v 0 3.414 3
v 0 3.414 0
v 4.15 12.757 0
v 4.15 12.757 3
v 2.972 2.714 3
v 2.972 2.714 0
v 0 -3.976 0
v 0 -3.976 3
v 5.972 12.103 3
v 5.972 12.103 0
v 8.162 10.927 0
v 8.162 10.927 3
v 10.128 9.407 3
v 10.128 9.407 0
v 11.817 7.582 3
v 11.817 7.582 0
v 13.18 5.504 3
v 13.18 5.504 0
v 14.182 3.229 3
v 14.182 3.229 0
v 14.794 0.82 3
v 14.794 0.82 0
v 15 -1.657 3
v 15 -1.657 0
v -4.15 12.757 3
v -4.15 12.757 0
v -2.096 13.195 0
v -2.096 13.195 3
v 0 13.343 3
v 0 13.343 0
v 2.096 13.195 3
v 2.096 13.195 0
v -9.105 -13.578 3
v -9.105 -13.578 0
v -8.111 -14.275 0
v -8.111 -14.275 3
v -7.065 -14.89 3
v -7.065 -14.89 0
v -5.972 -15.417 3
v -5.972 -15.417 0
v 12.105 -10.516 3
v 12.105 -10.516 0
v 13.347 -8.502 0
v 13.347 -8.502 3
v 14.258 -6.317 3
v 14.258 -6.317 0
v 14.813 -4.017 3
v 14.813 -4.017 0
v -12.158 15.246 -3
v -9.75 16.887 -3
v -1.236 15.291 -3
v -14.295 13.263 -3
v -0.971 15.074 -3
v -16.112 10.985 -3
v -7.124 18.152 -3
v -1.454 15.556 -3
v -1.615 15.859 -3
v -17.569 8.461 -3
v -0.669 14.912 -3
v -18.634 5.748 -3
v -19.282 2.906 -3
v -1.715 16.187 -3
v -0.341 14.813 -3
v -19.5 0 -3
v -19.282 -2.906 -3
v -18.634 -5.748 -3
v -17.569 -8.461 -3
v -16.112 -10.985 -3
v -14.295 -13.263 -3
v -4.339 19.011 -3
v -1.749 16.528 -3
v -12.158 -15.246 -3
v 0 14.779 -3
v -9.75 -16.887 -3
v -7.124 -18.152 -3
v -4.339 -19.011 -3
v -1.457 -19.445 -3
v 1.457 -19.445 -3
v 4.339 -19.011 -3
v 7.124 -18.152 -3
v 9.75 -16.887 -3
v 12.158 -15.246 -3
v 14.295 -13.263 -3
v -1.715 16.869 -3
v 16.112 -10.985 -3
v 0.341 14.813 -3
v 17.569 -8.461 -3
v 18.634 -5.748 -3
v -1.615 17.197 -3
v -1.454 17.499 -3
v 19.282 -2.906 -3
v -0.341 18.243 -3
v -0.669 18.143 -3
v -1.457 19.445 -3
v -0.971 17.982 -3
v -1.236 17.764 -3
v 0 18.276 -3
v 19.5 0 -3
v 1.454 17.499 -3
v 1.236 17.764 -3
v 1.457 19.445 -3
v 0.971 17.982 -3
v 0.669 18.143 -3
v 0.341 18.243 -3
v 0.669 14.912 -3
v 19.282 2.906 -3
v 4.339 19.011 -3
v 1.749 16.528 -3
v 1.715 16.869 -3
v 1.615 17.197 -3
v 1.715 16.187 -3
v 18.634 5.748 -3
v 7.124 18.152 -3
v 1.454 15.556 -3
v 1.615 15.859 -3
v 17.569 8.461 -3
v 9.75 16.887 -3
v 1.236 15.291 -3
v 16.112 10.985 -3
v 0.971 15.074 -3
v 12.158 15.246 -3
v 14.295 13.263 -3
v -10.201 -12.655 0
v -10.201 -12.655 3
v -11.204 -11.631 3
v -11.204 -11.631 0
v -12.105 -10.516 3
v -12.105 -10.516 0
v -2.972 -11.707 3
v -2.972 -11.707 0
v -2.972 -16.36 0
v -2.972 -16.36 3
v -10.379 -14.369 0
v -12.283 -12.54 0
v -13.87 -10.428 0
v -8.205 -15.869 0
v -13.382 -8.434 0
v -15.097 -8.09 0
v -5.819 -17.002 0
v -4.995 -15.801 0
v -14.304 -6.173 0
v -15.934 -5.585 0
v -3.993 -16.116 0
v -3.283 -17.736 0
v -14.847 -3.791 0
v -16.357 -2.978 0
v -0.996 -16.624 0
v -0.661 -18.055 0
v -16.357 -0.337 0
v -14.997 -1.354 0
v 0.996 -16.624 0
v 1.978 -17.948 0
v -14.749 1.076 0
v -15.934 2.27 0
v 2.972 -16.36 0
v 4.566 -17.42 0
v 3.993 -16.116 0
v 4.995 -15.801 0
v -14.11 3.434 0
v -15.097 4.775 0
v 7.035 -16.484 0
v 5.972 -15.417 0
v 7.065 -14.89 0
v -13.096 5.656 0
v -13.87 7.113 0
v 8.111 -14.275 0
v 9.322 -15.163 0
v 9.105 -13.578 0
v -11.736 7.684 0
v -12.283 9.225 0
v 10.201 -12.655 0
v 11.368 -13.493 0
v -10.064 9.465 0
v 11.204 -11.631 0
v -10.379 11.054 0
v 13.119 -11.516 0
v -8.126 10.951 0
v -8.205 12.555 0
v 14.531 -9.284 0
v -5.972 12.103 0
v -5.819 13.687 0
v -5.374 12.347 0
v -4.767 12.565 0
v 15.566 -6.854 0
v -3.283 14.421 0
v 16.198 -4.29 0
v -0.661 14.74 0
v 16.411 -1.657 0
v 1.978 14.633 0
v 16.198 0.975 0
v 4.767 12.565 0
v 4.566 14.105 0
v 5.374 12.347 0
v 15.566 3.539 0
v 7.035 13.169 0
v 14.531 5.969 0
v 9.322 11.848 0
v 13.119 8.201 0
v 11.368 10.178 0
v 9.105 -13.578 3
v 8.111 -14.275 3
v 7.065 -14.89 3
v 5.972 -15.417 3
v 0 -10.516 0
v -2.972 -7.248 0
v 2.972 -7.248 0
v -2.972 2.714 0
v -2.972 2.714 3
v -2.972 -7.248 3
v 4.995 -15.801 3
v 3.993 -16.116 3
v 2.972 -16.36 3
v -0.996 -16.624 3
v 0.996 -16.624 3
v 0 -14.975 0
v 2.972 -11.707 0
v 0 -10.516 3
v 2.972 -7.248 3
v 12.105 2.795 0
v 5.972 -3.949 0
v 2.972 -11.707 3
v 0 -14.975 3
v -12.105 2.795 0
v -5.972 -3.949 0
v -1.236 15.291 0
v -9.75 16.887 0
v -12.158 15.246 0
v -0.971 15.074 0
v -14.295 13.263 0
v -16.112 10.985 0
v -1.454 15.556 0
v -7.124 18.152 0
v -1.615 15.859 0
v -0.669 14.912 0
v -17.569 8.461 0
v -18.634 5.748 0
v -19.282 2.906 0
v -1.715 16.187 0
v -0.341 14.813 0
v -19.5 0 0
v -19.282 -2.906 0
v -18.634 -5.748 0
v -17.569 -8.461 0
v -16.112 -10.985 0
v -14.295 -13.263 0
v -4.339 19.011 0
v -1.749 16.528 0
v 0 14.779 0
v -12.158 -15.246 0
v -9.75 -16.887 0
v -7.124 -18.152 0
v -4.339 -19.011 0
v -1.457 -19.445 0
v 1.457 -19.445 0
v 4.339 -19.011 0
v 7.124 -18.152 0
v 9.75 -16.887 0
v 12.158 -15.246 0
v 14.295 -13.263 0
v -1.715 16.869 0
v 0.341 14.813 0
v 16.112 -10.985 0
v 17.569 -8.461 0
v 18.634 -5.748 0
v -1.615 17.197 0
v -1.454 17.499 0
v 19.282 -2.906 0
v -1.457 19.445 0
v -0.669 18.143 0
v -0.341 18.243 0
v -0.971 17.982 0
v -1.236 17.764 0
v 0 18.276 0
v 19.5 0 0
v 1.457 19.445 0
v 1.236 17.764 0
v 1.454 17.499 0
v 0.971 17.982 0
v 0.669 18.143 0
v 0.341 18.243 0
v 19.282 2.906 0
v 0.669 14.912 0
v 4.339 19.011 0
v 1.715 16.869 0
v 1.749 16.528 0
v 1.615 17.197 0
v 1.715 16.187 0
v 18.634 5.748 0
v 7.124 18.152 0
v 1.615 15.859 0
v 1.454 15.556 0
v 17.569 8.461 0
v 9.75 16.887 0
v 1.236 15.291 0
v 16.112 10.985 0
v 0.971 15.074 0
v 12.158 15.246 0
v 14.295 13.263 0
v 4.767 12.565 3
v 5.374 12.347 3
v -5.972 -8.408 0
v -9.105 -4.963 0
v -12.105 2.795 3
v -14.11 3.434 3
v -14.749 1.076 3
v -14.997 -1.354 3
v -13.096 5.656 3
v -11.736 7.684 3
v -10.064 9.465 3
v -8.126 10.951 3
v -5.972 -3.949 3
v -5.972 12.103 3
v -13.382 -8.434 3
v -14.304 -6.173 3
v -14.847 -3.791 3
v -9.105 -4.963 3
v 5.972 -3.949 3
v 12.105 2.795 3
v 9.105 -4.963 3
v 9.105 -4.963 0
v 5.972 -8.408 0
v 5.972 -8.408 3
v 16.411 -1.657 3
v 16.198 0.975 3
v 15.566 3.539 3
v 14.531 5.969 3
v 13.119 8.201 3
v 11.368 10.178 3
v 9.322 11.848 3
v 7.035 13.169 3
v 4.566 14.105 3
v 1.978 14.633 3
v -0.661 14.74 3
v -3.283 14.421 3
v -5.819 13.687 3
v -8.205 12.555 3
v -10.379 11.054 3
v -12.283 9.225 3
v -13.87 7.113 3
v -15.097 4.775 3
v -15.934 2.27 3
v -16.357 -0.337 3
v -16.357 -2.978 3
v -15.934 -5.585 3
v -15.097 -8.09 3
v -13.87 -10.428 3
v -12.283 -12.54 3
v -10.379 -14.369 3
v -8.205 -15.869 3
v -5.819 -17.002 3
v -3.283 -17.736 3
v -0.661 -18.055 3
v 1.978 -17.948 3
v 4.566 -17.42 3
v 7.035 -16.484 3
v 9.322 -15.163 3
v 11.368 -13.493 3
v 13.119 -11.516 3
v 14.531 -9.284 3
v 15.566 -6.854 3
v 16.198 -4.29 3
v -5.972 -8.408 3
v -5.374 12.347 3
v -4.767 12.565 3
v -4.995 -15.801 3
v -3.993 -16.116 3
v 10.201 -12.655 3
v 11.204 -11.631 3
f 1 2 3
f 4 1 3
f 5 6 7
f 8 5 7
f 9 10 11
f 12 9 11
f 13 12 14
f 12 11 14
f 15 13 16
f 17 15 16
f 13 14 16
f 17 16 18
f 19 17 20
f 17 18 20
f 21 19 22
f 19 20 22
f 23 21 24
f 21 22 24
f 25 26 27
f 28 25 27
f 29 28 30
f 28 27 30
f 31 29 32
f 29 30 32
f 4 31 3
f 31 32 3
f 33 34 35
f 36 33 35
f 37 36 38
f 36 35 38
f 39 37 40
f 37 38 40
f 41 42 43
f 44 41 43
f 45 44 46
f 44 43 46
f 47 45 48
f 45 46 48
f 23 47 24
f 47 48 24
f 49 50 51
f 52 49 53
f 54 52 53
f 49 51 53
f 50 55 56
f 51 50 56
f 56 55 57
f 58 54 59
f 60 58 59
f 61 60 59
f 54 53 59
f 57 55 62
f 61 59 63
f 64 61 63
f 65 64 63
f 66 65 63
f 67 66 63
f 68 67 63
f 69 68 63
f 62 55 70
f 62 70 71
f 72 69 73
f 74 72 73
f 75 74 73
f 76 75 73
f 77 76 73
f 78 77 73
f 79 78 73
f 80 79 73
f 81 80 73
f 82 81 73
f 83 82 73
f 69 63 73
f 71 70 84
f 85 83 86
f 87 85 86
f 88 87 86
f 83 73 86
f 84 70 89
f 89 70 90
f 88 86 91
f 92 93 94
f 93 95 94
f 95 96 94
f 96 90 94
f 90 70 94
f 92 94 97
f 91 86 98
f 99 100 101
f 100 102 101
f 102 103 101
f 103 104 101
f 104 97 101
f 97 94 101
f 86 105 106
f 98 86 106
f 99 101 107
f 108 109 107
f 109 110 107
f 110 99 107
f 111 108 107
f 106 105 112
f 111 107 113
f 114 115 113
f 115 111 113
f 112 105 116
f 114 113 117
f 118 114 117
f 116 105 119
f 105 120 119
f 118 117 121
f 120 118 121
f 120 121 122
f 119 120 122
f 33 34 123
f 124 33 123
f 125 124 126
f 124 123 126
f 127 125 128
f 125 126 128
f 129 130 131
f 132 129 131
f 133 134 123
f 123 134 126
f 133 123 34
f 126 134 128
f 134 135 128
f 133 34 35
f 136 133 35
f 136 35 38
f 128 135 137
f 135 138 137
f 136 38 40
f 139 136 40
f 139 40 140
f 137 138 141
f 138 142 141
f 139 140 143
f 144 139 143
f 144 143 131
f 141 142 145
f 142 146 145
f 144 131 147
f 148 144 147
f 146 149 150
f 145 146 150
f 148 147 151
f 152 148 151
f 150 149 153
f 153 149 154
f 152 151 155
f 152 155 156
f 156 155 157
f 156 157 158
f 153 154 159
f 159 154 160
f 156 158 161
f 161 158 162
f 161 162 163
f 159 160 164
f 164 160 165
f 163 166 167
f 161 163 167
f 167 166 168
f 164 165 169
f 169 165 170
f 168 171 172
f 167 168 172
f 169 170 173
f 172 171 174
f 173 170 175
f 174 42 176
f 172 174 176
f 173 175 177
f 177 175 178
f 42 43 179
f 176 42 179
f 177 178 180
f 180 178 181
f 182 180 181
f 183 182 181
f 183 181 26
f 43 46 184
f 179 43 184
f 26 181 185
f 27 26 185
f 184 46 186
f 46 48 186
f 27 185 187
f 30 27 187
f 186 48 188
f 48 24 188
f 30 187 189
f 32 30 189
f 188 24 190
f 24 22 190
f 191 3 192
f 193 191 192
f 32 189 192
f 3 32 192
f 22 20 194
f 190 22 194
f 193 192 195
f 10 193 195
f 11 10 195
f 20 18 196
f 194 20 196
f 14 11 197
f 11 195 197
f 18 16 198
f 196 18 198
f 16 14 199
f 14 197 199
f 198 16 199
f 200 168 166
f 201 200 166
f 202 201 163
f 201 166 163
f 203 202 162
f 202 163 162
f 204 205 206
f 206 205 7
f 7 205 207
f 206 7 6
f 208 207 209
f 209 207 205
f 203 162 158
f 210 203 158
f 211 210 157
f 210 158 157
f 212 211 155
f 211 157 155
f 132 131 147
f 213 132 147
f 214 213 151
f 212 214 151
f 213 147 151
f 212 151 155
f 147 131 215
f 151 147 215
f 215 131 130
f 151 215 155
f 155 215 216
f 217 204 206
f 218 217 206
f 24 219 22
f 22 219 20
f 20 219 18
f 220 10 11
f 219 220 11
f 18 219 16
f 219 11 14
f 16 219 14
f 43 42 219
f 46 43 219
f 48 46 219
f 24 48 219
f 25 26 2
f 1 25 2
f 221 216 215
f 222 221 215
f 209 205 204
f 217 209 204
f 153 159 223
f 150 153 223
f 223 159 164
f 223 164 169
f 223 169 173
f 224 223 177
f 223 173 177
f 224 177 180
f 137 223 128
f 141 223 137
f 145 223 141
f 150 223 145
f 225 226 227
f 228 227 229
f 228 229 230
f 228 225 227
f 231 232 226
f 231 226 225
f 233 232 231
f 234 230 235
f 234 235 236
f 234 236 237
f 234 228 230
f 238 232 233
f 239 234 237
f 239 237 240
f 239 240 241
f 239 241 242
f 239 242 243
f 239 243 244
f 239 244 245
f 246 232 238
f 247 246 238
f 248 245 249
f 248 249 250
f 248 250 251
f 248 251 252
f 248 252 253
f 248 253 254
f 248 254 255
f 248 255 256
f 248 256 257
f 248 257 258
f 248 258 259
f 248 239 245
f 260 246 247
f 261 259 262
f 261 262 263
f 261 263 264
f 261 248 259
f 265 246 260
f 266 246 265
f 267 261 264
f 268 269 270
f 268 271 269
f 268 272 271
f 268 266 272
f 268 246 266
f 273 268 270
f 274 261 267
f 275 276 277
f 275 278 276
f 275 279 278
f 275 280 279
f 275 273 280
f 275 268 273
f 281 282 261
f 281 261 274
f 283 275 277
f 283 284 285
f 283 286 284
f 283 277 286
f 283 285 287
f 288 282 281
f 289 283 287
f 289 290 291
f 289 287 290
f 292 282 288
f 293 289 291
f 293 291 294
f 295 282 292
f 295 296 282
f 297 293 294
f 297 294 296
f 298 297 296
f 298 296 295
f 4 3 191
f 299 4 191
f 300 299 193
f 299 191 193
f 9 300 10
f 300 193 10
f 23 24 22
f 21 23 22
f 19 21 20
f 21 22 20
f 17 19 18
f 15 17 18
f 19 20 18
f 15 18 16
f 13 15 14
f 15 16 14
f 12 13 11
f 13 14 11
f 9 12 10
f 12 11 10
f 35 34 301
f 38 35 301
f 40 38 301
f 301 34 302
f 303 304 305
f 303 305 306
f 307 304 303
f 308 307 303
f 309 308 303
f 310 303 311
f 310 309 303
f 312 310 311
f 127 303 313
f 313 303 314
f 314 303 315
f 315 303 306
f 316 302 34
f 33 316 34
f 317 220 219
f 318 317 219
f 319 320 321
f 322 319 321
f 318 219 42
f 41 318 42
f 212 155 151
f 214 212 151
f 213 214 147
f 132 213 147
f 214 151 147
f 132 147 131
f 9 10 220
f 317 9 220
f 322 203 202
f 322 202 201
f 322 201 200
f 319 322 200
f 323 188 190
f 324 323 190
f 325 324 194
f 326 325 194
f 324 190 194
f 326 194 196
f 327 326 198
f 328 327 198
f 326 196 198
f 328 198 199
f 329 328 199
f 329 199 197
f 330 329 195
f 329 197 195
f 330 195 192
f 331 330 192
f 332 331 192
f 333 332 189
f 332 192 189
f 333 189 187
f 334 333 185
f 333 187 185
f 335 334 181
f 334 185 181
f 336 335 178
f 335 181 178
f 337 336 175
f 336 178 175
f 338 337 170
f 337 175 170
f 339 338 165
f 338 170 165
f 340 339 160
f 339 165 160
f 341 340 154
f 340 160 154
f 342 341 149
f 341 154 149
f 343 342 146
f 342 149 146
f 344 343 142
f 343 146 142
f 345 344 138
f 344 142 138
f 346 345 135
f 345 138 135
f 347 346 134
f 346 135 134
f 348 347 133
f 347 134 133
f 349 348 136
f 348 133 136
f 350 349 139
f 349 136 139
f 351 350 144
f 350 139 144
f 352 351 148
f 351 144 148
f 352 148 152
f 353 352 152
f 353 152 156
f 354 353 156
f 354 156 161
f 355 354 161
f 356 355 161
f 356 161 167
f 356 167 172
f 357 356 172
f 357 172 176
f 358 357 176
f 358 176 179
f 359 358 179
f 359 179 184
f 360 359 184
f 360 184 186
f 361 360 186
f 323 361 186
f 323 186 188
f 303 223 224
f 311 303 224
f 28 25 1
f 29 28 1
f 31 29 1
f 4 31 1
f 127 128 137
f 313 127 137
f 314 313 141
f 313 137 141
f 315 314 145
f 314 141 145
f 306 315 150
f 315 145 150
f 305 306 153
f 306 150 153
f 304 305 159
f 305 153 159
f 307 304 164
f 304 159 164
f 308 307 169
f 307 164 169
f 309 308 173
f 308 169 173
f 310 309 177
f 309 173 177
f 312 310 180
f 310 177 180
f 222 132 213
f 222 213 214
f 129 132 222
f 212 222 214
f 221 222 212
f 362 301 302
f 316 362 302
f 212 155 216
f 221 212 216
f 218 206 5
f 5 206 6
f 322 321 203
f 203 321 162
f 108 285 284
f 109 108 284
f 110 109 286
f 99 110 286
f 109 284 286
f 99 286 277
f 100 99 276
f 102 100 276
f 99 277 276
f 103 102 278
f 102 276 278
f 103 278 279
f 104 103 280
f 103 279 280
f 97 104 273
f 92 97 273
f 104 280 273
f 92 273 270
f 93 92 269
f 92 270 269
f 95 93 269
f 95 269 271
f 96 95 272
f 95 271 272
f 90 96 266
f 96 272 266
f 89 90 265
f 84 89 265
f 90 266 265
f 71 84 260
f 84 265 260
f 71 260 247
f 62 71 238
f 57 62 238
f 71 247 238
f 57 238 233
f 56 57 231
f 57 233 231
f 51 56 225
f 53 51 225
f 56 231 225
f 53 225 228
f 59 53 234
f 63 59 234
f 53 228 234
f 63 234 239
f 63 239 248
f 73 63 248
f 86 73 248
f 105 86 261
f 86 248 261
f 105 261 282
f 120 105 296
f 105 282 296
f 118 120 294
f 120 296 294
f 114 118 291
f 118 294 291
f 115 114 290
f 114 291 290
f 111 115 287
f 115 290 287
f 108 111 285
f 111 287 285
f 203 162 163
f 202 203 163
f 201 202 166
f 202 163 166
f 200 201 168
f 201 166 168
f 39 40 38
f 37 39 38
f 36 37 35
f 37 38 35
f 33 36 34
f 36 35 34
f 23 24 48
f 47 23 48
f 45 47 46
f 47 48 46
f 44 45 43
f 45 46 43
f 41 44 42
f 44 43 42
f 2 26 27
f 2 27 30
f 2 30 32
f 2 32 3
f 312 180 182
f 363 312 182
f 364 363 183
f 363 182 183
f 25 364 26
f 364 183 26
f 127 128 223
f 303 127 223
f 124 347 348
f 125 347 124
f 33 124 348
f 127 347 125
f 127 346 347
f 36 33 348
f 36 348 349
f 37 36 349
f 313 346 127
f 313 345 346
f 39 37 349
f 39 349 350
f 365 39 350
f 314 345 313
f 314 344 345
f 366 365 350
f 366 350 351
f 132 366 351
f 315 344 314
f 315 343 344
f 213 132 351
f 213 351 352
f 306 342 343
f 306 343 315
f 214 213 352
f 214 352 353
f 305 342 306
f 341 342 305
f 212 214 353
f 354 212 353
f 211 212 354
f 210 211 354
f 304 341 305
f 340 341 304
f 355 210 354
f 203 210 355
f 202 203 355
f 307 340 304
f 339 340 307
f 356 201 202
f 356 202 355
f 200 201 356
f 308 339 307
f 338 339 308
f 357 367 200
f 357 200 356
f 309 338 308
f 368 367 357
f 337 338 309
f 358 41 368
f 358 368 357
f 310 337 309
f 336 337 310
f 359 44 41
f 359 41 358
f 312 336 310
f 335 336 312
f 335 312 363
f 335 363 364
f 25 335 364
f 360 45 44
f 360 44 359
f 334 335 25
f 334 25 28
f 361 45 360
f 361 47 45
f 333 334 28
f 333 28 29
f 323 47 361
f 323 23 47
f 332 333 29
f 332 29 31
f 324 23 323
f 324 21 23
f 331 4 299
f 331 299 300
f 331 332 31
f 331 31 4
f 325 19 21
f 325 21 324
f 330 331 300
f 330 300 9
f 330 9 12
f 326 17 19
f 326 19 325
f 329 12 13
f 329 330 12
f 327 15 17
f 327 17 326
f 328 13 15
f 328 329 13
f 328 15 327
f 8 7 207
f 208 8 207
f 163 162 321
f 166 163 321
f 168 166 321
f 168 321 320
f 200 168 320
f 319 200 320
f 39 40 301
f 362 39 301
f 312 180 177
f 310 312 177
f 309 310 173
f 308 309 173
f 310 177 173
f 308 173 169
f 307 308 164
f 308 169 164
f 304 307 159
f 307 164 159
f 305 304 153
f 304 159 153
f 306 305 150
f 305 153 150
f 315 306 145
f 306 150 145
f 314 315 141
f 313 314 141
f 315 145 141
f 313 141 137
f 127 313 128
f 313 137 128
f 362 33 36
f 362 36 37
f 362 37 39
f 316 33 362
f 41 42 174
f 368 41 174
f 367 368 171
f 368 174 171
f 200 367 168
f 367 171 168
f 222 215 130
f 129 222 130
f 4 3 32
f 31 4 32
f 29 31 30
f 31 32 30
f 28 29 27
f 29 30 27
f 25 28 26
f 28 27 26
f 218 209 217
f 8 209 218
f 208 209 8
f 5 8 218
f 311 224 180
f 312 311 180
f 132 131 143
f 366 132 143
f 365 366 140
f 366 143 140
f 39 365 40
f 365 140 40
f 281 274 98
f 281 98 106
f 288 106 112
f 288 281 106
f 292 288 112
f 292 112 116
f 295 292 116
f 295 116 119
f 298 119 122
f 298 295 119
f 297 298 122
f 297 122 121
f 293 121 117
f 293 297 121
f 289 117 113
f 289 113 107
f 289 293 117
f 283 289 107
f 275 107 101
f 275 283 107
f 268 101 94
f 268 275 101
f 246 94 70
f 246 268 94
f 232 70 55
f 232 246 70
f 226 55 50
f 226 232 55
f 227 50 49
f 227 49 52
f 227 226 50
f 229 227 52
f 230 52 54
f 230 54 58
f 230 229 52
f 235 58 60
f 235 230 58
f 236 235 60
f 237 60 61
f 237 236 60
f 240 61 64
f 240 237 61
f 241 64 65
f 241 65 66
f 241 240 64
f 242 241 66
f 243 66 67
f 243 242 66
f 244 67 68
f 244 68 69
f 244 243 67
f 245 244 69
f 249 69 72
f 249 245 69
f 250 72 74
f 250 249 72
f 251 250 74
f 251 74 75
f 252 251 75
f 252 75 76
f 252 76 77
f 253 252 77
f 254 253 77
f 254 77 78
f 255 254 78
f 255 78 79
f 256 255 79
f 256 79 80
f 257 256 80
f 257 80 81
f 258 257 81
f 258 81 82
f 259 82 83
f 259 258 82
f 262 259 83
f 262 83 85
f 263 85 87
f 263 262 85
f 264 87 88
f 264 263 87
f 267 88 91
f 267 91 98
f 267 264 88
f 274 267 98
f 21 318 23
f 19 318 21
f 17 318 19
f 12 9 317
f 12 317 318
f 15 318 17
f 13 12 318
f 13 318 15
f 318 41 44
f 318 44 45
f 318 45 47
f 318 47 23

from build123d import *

# Parameters (mm, degrees)
F1_DEPTH = 3
F2_R     = 19.5
F2_R_2   = 1.748545
F3_DEPTH = 3
F0_R     = 16.410569
F4_DEPTH = 3


with BuildPart() as f1:
    # F0 (on Top) → F1 (new body)
    with BuildSketch(Plane.XY):
        with BuildLine():
            Line((-5.971908, -3.949249), (-5.971908, 12.102502))
            ThreePointArc((-5.971908, 12.102502), (-14.477266, 2.26795), (-12.104758, -10.516054))
            Line((-12.104758, -10.516054), (-12.104758, 2.79453))
            Line((-12.104758, 2.79453), (-5.971908, -3.949249))
        make_face()
        with BuildLine():
            Line((0, 3.414068), (4.150382, 12.756928))
            ThreePointArc((4.150382, 12.756928), (0, 13.342549), (-4.150382, 12.756928))
            Line((-4.150382, 12.756928), (0, 3.414068))
        make_face()
        with BuildLine():
            ThreePointArc((12.104758, -10.516054), (14.257829, -6.317313), (15, -1.657451))
            ThreePointArc((15, -1.657451), (12.541504, 6.5712), (5.971908, 12.102502))
            Line((5.971908, 12.102502), (5.971908, -3.949249))
            Line((5.971908, -3.949249), (12.104758, 2.79453))
            Line((12.104758, 2.79453), (12.104758, -10.516054))
        make_face()
        with BuildLine():
            ThreePointArc((5.971908, -15.417404), (7.594219, -14.592977), (9.104758, -13.578163))
            Line((9.104758, -13.578163), (9.104758, -4.963286))
            Line((9.104758, -4.963286), (5.971908, -8.408217))
            Line((5.971908, -8.408217), (5.971908, -15.417404))
        make_face()
        Polygon((2.971908, -7.248096), (2.971908, 2.714468), (0, -3.975548), (-2.971908, 2.714468), (-2.971908, -7.248096), (0, -10.516054), align=None)
        with BuildLine():
            ThreePointArc((-2.971908, -16.360096), (0, -16.657451), (2.971908, -16.360096))
            Line((2.971908, -16.360096), (2.971908, -13.733779))
            Line((2.971908, -13.733779), (2.971908, -11.707064))
            Line((2.971908, -11.707064), (0, -14.975022))
            Line((0, -14.975022), (-2.971908, -11.707064))
            Line((-2.971908, -11.707064), (-2.971908, -16.360096))
        make_face()
        with BuildLine():
            Line((-9.104758, -4.963286), (-9.104758, -13.578163))
            ThreePointArc((-9.104758, -13.578163), (-7.594219, -14.592977), (-5.971908, -15.417404))
            Line((-5.971908, -15.417404), (-5.971908, -8.408217))
            Line((-5.971908, -8.408217), (-9.104758, -4.963286))
        make_face()
    extrude(amount=F1_DEPTH)


with BuildPart() as f3:
    # F2 (on Top) → F3 (new body)
    with BuildSketch(Plane.XY):
        Circle(F2_R)
        with Locations((0, 16.527854)):
            Circle(F2_R_2, mode=Mode.SUBTRACT)
    extrude(amount=-F3_DEPTH)


with BuildPart() as f4:
    # F0 (on Top) → F4 (new body)
    with BuildSketch(Plane.XY):
        with Locations((0, -1.657451)):
            Circle(F0_R)
        with BuildLine():
            ThreePointArc((5.971908, 12.102502), (12.541504, 6.5712), (15, -1.657451))
            ThreePointArc((15, -1.657451), (14.257829, -6.317313), (12.104758, -10.516054))
            ThreePointArc((12.104758, -10.516054), (10.71471, -12.154831), (9.104758, -13.578163))
            ThreePointArc((9.104758, -13.578163), (7.594219, -14.592977), (5.971908, -15.417404))
            ThreePointArc((5.971908, -15.417404), (4.49668, -15.967583), (2.971908, -16.360096))
            ThreePointArc((2.971908, -16.360096), (0, -16.657451), (-2.971908, -16.360096))
            ThreePointArc((-2.971908, -16.360096), (-4.49668, -15.967583), (-5.971908, -15.417404))
            ThreePointArc((-5.971908, -15.417404), (-7.594219, -14.592977), (-9.104758, -13.578163))
            ThreePointArc((-9.104758, -13.578163), (-10.71471, -12.154831), (-12.104758, -10.516054))
            ThreePointArc((-12.104758, -10.516054), (-14.477266, 2.26795), (-5.971908, 12.102502))
            ThreePointArc((-5.971908, 12.102502), (-5.071711, 12.459126), (-4.150382, 12.756928))
            ThreePointArc((-4.150382, 12.756928), (0, 13.342549), (4.150382, 12.756928))
            ThreePointArc((4.150382, 12.756928), (5.071711, 12.459126), (5.971908, 12.102502))
        make_face(mode=Mode.SUBTRACT)
    extrude(amount=F4_DEPTH)


solid = Compound([f1.part, f3.part, f4.part])
